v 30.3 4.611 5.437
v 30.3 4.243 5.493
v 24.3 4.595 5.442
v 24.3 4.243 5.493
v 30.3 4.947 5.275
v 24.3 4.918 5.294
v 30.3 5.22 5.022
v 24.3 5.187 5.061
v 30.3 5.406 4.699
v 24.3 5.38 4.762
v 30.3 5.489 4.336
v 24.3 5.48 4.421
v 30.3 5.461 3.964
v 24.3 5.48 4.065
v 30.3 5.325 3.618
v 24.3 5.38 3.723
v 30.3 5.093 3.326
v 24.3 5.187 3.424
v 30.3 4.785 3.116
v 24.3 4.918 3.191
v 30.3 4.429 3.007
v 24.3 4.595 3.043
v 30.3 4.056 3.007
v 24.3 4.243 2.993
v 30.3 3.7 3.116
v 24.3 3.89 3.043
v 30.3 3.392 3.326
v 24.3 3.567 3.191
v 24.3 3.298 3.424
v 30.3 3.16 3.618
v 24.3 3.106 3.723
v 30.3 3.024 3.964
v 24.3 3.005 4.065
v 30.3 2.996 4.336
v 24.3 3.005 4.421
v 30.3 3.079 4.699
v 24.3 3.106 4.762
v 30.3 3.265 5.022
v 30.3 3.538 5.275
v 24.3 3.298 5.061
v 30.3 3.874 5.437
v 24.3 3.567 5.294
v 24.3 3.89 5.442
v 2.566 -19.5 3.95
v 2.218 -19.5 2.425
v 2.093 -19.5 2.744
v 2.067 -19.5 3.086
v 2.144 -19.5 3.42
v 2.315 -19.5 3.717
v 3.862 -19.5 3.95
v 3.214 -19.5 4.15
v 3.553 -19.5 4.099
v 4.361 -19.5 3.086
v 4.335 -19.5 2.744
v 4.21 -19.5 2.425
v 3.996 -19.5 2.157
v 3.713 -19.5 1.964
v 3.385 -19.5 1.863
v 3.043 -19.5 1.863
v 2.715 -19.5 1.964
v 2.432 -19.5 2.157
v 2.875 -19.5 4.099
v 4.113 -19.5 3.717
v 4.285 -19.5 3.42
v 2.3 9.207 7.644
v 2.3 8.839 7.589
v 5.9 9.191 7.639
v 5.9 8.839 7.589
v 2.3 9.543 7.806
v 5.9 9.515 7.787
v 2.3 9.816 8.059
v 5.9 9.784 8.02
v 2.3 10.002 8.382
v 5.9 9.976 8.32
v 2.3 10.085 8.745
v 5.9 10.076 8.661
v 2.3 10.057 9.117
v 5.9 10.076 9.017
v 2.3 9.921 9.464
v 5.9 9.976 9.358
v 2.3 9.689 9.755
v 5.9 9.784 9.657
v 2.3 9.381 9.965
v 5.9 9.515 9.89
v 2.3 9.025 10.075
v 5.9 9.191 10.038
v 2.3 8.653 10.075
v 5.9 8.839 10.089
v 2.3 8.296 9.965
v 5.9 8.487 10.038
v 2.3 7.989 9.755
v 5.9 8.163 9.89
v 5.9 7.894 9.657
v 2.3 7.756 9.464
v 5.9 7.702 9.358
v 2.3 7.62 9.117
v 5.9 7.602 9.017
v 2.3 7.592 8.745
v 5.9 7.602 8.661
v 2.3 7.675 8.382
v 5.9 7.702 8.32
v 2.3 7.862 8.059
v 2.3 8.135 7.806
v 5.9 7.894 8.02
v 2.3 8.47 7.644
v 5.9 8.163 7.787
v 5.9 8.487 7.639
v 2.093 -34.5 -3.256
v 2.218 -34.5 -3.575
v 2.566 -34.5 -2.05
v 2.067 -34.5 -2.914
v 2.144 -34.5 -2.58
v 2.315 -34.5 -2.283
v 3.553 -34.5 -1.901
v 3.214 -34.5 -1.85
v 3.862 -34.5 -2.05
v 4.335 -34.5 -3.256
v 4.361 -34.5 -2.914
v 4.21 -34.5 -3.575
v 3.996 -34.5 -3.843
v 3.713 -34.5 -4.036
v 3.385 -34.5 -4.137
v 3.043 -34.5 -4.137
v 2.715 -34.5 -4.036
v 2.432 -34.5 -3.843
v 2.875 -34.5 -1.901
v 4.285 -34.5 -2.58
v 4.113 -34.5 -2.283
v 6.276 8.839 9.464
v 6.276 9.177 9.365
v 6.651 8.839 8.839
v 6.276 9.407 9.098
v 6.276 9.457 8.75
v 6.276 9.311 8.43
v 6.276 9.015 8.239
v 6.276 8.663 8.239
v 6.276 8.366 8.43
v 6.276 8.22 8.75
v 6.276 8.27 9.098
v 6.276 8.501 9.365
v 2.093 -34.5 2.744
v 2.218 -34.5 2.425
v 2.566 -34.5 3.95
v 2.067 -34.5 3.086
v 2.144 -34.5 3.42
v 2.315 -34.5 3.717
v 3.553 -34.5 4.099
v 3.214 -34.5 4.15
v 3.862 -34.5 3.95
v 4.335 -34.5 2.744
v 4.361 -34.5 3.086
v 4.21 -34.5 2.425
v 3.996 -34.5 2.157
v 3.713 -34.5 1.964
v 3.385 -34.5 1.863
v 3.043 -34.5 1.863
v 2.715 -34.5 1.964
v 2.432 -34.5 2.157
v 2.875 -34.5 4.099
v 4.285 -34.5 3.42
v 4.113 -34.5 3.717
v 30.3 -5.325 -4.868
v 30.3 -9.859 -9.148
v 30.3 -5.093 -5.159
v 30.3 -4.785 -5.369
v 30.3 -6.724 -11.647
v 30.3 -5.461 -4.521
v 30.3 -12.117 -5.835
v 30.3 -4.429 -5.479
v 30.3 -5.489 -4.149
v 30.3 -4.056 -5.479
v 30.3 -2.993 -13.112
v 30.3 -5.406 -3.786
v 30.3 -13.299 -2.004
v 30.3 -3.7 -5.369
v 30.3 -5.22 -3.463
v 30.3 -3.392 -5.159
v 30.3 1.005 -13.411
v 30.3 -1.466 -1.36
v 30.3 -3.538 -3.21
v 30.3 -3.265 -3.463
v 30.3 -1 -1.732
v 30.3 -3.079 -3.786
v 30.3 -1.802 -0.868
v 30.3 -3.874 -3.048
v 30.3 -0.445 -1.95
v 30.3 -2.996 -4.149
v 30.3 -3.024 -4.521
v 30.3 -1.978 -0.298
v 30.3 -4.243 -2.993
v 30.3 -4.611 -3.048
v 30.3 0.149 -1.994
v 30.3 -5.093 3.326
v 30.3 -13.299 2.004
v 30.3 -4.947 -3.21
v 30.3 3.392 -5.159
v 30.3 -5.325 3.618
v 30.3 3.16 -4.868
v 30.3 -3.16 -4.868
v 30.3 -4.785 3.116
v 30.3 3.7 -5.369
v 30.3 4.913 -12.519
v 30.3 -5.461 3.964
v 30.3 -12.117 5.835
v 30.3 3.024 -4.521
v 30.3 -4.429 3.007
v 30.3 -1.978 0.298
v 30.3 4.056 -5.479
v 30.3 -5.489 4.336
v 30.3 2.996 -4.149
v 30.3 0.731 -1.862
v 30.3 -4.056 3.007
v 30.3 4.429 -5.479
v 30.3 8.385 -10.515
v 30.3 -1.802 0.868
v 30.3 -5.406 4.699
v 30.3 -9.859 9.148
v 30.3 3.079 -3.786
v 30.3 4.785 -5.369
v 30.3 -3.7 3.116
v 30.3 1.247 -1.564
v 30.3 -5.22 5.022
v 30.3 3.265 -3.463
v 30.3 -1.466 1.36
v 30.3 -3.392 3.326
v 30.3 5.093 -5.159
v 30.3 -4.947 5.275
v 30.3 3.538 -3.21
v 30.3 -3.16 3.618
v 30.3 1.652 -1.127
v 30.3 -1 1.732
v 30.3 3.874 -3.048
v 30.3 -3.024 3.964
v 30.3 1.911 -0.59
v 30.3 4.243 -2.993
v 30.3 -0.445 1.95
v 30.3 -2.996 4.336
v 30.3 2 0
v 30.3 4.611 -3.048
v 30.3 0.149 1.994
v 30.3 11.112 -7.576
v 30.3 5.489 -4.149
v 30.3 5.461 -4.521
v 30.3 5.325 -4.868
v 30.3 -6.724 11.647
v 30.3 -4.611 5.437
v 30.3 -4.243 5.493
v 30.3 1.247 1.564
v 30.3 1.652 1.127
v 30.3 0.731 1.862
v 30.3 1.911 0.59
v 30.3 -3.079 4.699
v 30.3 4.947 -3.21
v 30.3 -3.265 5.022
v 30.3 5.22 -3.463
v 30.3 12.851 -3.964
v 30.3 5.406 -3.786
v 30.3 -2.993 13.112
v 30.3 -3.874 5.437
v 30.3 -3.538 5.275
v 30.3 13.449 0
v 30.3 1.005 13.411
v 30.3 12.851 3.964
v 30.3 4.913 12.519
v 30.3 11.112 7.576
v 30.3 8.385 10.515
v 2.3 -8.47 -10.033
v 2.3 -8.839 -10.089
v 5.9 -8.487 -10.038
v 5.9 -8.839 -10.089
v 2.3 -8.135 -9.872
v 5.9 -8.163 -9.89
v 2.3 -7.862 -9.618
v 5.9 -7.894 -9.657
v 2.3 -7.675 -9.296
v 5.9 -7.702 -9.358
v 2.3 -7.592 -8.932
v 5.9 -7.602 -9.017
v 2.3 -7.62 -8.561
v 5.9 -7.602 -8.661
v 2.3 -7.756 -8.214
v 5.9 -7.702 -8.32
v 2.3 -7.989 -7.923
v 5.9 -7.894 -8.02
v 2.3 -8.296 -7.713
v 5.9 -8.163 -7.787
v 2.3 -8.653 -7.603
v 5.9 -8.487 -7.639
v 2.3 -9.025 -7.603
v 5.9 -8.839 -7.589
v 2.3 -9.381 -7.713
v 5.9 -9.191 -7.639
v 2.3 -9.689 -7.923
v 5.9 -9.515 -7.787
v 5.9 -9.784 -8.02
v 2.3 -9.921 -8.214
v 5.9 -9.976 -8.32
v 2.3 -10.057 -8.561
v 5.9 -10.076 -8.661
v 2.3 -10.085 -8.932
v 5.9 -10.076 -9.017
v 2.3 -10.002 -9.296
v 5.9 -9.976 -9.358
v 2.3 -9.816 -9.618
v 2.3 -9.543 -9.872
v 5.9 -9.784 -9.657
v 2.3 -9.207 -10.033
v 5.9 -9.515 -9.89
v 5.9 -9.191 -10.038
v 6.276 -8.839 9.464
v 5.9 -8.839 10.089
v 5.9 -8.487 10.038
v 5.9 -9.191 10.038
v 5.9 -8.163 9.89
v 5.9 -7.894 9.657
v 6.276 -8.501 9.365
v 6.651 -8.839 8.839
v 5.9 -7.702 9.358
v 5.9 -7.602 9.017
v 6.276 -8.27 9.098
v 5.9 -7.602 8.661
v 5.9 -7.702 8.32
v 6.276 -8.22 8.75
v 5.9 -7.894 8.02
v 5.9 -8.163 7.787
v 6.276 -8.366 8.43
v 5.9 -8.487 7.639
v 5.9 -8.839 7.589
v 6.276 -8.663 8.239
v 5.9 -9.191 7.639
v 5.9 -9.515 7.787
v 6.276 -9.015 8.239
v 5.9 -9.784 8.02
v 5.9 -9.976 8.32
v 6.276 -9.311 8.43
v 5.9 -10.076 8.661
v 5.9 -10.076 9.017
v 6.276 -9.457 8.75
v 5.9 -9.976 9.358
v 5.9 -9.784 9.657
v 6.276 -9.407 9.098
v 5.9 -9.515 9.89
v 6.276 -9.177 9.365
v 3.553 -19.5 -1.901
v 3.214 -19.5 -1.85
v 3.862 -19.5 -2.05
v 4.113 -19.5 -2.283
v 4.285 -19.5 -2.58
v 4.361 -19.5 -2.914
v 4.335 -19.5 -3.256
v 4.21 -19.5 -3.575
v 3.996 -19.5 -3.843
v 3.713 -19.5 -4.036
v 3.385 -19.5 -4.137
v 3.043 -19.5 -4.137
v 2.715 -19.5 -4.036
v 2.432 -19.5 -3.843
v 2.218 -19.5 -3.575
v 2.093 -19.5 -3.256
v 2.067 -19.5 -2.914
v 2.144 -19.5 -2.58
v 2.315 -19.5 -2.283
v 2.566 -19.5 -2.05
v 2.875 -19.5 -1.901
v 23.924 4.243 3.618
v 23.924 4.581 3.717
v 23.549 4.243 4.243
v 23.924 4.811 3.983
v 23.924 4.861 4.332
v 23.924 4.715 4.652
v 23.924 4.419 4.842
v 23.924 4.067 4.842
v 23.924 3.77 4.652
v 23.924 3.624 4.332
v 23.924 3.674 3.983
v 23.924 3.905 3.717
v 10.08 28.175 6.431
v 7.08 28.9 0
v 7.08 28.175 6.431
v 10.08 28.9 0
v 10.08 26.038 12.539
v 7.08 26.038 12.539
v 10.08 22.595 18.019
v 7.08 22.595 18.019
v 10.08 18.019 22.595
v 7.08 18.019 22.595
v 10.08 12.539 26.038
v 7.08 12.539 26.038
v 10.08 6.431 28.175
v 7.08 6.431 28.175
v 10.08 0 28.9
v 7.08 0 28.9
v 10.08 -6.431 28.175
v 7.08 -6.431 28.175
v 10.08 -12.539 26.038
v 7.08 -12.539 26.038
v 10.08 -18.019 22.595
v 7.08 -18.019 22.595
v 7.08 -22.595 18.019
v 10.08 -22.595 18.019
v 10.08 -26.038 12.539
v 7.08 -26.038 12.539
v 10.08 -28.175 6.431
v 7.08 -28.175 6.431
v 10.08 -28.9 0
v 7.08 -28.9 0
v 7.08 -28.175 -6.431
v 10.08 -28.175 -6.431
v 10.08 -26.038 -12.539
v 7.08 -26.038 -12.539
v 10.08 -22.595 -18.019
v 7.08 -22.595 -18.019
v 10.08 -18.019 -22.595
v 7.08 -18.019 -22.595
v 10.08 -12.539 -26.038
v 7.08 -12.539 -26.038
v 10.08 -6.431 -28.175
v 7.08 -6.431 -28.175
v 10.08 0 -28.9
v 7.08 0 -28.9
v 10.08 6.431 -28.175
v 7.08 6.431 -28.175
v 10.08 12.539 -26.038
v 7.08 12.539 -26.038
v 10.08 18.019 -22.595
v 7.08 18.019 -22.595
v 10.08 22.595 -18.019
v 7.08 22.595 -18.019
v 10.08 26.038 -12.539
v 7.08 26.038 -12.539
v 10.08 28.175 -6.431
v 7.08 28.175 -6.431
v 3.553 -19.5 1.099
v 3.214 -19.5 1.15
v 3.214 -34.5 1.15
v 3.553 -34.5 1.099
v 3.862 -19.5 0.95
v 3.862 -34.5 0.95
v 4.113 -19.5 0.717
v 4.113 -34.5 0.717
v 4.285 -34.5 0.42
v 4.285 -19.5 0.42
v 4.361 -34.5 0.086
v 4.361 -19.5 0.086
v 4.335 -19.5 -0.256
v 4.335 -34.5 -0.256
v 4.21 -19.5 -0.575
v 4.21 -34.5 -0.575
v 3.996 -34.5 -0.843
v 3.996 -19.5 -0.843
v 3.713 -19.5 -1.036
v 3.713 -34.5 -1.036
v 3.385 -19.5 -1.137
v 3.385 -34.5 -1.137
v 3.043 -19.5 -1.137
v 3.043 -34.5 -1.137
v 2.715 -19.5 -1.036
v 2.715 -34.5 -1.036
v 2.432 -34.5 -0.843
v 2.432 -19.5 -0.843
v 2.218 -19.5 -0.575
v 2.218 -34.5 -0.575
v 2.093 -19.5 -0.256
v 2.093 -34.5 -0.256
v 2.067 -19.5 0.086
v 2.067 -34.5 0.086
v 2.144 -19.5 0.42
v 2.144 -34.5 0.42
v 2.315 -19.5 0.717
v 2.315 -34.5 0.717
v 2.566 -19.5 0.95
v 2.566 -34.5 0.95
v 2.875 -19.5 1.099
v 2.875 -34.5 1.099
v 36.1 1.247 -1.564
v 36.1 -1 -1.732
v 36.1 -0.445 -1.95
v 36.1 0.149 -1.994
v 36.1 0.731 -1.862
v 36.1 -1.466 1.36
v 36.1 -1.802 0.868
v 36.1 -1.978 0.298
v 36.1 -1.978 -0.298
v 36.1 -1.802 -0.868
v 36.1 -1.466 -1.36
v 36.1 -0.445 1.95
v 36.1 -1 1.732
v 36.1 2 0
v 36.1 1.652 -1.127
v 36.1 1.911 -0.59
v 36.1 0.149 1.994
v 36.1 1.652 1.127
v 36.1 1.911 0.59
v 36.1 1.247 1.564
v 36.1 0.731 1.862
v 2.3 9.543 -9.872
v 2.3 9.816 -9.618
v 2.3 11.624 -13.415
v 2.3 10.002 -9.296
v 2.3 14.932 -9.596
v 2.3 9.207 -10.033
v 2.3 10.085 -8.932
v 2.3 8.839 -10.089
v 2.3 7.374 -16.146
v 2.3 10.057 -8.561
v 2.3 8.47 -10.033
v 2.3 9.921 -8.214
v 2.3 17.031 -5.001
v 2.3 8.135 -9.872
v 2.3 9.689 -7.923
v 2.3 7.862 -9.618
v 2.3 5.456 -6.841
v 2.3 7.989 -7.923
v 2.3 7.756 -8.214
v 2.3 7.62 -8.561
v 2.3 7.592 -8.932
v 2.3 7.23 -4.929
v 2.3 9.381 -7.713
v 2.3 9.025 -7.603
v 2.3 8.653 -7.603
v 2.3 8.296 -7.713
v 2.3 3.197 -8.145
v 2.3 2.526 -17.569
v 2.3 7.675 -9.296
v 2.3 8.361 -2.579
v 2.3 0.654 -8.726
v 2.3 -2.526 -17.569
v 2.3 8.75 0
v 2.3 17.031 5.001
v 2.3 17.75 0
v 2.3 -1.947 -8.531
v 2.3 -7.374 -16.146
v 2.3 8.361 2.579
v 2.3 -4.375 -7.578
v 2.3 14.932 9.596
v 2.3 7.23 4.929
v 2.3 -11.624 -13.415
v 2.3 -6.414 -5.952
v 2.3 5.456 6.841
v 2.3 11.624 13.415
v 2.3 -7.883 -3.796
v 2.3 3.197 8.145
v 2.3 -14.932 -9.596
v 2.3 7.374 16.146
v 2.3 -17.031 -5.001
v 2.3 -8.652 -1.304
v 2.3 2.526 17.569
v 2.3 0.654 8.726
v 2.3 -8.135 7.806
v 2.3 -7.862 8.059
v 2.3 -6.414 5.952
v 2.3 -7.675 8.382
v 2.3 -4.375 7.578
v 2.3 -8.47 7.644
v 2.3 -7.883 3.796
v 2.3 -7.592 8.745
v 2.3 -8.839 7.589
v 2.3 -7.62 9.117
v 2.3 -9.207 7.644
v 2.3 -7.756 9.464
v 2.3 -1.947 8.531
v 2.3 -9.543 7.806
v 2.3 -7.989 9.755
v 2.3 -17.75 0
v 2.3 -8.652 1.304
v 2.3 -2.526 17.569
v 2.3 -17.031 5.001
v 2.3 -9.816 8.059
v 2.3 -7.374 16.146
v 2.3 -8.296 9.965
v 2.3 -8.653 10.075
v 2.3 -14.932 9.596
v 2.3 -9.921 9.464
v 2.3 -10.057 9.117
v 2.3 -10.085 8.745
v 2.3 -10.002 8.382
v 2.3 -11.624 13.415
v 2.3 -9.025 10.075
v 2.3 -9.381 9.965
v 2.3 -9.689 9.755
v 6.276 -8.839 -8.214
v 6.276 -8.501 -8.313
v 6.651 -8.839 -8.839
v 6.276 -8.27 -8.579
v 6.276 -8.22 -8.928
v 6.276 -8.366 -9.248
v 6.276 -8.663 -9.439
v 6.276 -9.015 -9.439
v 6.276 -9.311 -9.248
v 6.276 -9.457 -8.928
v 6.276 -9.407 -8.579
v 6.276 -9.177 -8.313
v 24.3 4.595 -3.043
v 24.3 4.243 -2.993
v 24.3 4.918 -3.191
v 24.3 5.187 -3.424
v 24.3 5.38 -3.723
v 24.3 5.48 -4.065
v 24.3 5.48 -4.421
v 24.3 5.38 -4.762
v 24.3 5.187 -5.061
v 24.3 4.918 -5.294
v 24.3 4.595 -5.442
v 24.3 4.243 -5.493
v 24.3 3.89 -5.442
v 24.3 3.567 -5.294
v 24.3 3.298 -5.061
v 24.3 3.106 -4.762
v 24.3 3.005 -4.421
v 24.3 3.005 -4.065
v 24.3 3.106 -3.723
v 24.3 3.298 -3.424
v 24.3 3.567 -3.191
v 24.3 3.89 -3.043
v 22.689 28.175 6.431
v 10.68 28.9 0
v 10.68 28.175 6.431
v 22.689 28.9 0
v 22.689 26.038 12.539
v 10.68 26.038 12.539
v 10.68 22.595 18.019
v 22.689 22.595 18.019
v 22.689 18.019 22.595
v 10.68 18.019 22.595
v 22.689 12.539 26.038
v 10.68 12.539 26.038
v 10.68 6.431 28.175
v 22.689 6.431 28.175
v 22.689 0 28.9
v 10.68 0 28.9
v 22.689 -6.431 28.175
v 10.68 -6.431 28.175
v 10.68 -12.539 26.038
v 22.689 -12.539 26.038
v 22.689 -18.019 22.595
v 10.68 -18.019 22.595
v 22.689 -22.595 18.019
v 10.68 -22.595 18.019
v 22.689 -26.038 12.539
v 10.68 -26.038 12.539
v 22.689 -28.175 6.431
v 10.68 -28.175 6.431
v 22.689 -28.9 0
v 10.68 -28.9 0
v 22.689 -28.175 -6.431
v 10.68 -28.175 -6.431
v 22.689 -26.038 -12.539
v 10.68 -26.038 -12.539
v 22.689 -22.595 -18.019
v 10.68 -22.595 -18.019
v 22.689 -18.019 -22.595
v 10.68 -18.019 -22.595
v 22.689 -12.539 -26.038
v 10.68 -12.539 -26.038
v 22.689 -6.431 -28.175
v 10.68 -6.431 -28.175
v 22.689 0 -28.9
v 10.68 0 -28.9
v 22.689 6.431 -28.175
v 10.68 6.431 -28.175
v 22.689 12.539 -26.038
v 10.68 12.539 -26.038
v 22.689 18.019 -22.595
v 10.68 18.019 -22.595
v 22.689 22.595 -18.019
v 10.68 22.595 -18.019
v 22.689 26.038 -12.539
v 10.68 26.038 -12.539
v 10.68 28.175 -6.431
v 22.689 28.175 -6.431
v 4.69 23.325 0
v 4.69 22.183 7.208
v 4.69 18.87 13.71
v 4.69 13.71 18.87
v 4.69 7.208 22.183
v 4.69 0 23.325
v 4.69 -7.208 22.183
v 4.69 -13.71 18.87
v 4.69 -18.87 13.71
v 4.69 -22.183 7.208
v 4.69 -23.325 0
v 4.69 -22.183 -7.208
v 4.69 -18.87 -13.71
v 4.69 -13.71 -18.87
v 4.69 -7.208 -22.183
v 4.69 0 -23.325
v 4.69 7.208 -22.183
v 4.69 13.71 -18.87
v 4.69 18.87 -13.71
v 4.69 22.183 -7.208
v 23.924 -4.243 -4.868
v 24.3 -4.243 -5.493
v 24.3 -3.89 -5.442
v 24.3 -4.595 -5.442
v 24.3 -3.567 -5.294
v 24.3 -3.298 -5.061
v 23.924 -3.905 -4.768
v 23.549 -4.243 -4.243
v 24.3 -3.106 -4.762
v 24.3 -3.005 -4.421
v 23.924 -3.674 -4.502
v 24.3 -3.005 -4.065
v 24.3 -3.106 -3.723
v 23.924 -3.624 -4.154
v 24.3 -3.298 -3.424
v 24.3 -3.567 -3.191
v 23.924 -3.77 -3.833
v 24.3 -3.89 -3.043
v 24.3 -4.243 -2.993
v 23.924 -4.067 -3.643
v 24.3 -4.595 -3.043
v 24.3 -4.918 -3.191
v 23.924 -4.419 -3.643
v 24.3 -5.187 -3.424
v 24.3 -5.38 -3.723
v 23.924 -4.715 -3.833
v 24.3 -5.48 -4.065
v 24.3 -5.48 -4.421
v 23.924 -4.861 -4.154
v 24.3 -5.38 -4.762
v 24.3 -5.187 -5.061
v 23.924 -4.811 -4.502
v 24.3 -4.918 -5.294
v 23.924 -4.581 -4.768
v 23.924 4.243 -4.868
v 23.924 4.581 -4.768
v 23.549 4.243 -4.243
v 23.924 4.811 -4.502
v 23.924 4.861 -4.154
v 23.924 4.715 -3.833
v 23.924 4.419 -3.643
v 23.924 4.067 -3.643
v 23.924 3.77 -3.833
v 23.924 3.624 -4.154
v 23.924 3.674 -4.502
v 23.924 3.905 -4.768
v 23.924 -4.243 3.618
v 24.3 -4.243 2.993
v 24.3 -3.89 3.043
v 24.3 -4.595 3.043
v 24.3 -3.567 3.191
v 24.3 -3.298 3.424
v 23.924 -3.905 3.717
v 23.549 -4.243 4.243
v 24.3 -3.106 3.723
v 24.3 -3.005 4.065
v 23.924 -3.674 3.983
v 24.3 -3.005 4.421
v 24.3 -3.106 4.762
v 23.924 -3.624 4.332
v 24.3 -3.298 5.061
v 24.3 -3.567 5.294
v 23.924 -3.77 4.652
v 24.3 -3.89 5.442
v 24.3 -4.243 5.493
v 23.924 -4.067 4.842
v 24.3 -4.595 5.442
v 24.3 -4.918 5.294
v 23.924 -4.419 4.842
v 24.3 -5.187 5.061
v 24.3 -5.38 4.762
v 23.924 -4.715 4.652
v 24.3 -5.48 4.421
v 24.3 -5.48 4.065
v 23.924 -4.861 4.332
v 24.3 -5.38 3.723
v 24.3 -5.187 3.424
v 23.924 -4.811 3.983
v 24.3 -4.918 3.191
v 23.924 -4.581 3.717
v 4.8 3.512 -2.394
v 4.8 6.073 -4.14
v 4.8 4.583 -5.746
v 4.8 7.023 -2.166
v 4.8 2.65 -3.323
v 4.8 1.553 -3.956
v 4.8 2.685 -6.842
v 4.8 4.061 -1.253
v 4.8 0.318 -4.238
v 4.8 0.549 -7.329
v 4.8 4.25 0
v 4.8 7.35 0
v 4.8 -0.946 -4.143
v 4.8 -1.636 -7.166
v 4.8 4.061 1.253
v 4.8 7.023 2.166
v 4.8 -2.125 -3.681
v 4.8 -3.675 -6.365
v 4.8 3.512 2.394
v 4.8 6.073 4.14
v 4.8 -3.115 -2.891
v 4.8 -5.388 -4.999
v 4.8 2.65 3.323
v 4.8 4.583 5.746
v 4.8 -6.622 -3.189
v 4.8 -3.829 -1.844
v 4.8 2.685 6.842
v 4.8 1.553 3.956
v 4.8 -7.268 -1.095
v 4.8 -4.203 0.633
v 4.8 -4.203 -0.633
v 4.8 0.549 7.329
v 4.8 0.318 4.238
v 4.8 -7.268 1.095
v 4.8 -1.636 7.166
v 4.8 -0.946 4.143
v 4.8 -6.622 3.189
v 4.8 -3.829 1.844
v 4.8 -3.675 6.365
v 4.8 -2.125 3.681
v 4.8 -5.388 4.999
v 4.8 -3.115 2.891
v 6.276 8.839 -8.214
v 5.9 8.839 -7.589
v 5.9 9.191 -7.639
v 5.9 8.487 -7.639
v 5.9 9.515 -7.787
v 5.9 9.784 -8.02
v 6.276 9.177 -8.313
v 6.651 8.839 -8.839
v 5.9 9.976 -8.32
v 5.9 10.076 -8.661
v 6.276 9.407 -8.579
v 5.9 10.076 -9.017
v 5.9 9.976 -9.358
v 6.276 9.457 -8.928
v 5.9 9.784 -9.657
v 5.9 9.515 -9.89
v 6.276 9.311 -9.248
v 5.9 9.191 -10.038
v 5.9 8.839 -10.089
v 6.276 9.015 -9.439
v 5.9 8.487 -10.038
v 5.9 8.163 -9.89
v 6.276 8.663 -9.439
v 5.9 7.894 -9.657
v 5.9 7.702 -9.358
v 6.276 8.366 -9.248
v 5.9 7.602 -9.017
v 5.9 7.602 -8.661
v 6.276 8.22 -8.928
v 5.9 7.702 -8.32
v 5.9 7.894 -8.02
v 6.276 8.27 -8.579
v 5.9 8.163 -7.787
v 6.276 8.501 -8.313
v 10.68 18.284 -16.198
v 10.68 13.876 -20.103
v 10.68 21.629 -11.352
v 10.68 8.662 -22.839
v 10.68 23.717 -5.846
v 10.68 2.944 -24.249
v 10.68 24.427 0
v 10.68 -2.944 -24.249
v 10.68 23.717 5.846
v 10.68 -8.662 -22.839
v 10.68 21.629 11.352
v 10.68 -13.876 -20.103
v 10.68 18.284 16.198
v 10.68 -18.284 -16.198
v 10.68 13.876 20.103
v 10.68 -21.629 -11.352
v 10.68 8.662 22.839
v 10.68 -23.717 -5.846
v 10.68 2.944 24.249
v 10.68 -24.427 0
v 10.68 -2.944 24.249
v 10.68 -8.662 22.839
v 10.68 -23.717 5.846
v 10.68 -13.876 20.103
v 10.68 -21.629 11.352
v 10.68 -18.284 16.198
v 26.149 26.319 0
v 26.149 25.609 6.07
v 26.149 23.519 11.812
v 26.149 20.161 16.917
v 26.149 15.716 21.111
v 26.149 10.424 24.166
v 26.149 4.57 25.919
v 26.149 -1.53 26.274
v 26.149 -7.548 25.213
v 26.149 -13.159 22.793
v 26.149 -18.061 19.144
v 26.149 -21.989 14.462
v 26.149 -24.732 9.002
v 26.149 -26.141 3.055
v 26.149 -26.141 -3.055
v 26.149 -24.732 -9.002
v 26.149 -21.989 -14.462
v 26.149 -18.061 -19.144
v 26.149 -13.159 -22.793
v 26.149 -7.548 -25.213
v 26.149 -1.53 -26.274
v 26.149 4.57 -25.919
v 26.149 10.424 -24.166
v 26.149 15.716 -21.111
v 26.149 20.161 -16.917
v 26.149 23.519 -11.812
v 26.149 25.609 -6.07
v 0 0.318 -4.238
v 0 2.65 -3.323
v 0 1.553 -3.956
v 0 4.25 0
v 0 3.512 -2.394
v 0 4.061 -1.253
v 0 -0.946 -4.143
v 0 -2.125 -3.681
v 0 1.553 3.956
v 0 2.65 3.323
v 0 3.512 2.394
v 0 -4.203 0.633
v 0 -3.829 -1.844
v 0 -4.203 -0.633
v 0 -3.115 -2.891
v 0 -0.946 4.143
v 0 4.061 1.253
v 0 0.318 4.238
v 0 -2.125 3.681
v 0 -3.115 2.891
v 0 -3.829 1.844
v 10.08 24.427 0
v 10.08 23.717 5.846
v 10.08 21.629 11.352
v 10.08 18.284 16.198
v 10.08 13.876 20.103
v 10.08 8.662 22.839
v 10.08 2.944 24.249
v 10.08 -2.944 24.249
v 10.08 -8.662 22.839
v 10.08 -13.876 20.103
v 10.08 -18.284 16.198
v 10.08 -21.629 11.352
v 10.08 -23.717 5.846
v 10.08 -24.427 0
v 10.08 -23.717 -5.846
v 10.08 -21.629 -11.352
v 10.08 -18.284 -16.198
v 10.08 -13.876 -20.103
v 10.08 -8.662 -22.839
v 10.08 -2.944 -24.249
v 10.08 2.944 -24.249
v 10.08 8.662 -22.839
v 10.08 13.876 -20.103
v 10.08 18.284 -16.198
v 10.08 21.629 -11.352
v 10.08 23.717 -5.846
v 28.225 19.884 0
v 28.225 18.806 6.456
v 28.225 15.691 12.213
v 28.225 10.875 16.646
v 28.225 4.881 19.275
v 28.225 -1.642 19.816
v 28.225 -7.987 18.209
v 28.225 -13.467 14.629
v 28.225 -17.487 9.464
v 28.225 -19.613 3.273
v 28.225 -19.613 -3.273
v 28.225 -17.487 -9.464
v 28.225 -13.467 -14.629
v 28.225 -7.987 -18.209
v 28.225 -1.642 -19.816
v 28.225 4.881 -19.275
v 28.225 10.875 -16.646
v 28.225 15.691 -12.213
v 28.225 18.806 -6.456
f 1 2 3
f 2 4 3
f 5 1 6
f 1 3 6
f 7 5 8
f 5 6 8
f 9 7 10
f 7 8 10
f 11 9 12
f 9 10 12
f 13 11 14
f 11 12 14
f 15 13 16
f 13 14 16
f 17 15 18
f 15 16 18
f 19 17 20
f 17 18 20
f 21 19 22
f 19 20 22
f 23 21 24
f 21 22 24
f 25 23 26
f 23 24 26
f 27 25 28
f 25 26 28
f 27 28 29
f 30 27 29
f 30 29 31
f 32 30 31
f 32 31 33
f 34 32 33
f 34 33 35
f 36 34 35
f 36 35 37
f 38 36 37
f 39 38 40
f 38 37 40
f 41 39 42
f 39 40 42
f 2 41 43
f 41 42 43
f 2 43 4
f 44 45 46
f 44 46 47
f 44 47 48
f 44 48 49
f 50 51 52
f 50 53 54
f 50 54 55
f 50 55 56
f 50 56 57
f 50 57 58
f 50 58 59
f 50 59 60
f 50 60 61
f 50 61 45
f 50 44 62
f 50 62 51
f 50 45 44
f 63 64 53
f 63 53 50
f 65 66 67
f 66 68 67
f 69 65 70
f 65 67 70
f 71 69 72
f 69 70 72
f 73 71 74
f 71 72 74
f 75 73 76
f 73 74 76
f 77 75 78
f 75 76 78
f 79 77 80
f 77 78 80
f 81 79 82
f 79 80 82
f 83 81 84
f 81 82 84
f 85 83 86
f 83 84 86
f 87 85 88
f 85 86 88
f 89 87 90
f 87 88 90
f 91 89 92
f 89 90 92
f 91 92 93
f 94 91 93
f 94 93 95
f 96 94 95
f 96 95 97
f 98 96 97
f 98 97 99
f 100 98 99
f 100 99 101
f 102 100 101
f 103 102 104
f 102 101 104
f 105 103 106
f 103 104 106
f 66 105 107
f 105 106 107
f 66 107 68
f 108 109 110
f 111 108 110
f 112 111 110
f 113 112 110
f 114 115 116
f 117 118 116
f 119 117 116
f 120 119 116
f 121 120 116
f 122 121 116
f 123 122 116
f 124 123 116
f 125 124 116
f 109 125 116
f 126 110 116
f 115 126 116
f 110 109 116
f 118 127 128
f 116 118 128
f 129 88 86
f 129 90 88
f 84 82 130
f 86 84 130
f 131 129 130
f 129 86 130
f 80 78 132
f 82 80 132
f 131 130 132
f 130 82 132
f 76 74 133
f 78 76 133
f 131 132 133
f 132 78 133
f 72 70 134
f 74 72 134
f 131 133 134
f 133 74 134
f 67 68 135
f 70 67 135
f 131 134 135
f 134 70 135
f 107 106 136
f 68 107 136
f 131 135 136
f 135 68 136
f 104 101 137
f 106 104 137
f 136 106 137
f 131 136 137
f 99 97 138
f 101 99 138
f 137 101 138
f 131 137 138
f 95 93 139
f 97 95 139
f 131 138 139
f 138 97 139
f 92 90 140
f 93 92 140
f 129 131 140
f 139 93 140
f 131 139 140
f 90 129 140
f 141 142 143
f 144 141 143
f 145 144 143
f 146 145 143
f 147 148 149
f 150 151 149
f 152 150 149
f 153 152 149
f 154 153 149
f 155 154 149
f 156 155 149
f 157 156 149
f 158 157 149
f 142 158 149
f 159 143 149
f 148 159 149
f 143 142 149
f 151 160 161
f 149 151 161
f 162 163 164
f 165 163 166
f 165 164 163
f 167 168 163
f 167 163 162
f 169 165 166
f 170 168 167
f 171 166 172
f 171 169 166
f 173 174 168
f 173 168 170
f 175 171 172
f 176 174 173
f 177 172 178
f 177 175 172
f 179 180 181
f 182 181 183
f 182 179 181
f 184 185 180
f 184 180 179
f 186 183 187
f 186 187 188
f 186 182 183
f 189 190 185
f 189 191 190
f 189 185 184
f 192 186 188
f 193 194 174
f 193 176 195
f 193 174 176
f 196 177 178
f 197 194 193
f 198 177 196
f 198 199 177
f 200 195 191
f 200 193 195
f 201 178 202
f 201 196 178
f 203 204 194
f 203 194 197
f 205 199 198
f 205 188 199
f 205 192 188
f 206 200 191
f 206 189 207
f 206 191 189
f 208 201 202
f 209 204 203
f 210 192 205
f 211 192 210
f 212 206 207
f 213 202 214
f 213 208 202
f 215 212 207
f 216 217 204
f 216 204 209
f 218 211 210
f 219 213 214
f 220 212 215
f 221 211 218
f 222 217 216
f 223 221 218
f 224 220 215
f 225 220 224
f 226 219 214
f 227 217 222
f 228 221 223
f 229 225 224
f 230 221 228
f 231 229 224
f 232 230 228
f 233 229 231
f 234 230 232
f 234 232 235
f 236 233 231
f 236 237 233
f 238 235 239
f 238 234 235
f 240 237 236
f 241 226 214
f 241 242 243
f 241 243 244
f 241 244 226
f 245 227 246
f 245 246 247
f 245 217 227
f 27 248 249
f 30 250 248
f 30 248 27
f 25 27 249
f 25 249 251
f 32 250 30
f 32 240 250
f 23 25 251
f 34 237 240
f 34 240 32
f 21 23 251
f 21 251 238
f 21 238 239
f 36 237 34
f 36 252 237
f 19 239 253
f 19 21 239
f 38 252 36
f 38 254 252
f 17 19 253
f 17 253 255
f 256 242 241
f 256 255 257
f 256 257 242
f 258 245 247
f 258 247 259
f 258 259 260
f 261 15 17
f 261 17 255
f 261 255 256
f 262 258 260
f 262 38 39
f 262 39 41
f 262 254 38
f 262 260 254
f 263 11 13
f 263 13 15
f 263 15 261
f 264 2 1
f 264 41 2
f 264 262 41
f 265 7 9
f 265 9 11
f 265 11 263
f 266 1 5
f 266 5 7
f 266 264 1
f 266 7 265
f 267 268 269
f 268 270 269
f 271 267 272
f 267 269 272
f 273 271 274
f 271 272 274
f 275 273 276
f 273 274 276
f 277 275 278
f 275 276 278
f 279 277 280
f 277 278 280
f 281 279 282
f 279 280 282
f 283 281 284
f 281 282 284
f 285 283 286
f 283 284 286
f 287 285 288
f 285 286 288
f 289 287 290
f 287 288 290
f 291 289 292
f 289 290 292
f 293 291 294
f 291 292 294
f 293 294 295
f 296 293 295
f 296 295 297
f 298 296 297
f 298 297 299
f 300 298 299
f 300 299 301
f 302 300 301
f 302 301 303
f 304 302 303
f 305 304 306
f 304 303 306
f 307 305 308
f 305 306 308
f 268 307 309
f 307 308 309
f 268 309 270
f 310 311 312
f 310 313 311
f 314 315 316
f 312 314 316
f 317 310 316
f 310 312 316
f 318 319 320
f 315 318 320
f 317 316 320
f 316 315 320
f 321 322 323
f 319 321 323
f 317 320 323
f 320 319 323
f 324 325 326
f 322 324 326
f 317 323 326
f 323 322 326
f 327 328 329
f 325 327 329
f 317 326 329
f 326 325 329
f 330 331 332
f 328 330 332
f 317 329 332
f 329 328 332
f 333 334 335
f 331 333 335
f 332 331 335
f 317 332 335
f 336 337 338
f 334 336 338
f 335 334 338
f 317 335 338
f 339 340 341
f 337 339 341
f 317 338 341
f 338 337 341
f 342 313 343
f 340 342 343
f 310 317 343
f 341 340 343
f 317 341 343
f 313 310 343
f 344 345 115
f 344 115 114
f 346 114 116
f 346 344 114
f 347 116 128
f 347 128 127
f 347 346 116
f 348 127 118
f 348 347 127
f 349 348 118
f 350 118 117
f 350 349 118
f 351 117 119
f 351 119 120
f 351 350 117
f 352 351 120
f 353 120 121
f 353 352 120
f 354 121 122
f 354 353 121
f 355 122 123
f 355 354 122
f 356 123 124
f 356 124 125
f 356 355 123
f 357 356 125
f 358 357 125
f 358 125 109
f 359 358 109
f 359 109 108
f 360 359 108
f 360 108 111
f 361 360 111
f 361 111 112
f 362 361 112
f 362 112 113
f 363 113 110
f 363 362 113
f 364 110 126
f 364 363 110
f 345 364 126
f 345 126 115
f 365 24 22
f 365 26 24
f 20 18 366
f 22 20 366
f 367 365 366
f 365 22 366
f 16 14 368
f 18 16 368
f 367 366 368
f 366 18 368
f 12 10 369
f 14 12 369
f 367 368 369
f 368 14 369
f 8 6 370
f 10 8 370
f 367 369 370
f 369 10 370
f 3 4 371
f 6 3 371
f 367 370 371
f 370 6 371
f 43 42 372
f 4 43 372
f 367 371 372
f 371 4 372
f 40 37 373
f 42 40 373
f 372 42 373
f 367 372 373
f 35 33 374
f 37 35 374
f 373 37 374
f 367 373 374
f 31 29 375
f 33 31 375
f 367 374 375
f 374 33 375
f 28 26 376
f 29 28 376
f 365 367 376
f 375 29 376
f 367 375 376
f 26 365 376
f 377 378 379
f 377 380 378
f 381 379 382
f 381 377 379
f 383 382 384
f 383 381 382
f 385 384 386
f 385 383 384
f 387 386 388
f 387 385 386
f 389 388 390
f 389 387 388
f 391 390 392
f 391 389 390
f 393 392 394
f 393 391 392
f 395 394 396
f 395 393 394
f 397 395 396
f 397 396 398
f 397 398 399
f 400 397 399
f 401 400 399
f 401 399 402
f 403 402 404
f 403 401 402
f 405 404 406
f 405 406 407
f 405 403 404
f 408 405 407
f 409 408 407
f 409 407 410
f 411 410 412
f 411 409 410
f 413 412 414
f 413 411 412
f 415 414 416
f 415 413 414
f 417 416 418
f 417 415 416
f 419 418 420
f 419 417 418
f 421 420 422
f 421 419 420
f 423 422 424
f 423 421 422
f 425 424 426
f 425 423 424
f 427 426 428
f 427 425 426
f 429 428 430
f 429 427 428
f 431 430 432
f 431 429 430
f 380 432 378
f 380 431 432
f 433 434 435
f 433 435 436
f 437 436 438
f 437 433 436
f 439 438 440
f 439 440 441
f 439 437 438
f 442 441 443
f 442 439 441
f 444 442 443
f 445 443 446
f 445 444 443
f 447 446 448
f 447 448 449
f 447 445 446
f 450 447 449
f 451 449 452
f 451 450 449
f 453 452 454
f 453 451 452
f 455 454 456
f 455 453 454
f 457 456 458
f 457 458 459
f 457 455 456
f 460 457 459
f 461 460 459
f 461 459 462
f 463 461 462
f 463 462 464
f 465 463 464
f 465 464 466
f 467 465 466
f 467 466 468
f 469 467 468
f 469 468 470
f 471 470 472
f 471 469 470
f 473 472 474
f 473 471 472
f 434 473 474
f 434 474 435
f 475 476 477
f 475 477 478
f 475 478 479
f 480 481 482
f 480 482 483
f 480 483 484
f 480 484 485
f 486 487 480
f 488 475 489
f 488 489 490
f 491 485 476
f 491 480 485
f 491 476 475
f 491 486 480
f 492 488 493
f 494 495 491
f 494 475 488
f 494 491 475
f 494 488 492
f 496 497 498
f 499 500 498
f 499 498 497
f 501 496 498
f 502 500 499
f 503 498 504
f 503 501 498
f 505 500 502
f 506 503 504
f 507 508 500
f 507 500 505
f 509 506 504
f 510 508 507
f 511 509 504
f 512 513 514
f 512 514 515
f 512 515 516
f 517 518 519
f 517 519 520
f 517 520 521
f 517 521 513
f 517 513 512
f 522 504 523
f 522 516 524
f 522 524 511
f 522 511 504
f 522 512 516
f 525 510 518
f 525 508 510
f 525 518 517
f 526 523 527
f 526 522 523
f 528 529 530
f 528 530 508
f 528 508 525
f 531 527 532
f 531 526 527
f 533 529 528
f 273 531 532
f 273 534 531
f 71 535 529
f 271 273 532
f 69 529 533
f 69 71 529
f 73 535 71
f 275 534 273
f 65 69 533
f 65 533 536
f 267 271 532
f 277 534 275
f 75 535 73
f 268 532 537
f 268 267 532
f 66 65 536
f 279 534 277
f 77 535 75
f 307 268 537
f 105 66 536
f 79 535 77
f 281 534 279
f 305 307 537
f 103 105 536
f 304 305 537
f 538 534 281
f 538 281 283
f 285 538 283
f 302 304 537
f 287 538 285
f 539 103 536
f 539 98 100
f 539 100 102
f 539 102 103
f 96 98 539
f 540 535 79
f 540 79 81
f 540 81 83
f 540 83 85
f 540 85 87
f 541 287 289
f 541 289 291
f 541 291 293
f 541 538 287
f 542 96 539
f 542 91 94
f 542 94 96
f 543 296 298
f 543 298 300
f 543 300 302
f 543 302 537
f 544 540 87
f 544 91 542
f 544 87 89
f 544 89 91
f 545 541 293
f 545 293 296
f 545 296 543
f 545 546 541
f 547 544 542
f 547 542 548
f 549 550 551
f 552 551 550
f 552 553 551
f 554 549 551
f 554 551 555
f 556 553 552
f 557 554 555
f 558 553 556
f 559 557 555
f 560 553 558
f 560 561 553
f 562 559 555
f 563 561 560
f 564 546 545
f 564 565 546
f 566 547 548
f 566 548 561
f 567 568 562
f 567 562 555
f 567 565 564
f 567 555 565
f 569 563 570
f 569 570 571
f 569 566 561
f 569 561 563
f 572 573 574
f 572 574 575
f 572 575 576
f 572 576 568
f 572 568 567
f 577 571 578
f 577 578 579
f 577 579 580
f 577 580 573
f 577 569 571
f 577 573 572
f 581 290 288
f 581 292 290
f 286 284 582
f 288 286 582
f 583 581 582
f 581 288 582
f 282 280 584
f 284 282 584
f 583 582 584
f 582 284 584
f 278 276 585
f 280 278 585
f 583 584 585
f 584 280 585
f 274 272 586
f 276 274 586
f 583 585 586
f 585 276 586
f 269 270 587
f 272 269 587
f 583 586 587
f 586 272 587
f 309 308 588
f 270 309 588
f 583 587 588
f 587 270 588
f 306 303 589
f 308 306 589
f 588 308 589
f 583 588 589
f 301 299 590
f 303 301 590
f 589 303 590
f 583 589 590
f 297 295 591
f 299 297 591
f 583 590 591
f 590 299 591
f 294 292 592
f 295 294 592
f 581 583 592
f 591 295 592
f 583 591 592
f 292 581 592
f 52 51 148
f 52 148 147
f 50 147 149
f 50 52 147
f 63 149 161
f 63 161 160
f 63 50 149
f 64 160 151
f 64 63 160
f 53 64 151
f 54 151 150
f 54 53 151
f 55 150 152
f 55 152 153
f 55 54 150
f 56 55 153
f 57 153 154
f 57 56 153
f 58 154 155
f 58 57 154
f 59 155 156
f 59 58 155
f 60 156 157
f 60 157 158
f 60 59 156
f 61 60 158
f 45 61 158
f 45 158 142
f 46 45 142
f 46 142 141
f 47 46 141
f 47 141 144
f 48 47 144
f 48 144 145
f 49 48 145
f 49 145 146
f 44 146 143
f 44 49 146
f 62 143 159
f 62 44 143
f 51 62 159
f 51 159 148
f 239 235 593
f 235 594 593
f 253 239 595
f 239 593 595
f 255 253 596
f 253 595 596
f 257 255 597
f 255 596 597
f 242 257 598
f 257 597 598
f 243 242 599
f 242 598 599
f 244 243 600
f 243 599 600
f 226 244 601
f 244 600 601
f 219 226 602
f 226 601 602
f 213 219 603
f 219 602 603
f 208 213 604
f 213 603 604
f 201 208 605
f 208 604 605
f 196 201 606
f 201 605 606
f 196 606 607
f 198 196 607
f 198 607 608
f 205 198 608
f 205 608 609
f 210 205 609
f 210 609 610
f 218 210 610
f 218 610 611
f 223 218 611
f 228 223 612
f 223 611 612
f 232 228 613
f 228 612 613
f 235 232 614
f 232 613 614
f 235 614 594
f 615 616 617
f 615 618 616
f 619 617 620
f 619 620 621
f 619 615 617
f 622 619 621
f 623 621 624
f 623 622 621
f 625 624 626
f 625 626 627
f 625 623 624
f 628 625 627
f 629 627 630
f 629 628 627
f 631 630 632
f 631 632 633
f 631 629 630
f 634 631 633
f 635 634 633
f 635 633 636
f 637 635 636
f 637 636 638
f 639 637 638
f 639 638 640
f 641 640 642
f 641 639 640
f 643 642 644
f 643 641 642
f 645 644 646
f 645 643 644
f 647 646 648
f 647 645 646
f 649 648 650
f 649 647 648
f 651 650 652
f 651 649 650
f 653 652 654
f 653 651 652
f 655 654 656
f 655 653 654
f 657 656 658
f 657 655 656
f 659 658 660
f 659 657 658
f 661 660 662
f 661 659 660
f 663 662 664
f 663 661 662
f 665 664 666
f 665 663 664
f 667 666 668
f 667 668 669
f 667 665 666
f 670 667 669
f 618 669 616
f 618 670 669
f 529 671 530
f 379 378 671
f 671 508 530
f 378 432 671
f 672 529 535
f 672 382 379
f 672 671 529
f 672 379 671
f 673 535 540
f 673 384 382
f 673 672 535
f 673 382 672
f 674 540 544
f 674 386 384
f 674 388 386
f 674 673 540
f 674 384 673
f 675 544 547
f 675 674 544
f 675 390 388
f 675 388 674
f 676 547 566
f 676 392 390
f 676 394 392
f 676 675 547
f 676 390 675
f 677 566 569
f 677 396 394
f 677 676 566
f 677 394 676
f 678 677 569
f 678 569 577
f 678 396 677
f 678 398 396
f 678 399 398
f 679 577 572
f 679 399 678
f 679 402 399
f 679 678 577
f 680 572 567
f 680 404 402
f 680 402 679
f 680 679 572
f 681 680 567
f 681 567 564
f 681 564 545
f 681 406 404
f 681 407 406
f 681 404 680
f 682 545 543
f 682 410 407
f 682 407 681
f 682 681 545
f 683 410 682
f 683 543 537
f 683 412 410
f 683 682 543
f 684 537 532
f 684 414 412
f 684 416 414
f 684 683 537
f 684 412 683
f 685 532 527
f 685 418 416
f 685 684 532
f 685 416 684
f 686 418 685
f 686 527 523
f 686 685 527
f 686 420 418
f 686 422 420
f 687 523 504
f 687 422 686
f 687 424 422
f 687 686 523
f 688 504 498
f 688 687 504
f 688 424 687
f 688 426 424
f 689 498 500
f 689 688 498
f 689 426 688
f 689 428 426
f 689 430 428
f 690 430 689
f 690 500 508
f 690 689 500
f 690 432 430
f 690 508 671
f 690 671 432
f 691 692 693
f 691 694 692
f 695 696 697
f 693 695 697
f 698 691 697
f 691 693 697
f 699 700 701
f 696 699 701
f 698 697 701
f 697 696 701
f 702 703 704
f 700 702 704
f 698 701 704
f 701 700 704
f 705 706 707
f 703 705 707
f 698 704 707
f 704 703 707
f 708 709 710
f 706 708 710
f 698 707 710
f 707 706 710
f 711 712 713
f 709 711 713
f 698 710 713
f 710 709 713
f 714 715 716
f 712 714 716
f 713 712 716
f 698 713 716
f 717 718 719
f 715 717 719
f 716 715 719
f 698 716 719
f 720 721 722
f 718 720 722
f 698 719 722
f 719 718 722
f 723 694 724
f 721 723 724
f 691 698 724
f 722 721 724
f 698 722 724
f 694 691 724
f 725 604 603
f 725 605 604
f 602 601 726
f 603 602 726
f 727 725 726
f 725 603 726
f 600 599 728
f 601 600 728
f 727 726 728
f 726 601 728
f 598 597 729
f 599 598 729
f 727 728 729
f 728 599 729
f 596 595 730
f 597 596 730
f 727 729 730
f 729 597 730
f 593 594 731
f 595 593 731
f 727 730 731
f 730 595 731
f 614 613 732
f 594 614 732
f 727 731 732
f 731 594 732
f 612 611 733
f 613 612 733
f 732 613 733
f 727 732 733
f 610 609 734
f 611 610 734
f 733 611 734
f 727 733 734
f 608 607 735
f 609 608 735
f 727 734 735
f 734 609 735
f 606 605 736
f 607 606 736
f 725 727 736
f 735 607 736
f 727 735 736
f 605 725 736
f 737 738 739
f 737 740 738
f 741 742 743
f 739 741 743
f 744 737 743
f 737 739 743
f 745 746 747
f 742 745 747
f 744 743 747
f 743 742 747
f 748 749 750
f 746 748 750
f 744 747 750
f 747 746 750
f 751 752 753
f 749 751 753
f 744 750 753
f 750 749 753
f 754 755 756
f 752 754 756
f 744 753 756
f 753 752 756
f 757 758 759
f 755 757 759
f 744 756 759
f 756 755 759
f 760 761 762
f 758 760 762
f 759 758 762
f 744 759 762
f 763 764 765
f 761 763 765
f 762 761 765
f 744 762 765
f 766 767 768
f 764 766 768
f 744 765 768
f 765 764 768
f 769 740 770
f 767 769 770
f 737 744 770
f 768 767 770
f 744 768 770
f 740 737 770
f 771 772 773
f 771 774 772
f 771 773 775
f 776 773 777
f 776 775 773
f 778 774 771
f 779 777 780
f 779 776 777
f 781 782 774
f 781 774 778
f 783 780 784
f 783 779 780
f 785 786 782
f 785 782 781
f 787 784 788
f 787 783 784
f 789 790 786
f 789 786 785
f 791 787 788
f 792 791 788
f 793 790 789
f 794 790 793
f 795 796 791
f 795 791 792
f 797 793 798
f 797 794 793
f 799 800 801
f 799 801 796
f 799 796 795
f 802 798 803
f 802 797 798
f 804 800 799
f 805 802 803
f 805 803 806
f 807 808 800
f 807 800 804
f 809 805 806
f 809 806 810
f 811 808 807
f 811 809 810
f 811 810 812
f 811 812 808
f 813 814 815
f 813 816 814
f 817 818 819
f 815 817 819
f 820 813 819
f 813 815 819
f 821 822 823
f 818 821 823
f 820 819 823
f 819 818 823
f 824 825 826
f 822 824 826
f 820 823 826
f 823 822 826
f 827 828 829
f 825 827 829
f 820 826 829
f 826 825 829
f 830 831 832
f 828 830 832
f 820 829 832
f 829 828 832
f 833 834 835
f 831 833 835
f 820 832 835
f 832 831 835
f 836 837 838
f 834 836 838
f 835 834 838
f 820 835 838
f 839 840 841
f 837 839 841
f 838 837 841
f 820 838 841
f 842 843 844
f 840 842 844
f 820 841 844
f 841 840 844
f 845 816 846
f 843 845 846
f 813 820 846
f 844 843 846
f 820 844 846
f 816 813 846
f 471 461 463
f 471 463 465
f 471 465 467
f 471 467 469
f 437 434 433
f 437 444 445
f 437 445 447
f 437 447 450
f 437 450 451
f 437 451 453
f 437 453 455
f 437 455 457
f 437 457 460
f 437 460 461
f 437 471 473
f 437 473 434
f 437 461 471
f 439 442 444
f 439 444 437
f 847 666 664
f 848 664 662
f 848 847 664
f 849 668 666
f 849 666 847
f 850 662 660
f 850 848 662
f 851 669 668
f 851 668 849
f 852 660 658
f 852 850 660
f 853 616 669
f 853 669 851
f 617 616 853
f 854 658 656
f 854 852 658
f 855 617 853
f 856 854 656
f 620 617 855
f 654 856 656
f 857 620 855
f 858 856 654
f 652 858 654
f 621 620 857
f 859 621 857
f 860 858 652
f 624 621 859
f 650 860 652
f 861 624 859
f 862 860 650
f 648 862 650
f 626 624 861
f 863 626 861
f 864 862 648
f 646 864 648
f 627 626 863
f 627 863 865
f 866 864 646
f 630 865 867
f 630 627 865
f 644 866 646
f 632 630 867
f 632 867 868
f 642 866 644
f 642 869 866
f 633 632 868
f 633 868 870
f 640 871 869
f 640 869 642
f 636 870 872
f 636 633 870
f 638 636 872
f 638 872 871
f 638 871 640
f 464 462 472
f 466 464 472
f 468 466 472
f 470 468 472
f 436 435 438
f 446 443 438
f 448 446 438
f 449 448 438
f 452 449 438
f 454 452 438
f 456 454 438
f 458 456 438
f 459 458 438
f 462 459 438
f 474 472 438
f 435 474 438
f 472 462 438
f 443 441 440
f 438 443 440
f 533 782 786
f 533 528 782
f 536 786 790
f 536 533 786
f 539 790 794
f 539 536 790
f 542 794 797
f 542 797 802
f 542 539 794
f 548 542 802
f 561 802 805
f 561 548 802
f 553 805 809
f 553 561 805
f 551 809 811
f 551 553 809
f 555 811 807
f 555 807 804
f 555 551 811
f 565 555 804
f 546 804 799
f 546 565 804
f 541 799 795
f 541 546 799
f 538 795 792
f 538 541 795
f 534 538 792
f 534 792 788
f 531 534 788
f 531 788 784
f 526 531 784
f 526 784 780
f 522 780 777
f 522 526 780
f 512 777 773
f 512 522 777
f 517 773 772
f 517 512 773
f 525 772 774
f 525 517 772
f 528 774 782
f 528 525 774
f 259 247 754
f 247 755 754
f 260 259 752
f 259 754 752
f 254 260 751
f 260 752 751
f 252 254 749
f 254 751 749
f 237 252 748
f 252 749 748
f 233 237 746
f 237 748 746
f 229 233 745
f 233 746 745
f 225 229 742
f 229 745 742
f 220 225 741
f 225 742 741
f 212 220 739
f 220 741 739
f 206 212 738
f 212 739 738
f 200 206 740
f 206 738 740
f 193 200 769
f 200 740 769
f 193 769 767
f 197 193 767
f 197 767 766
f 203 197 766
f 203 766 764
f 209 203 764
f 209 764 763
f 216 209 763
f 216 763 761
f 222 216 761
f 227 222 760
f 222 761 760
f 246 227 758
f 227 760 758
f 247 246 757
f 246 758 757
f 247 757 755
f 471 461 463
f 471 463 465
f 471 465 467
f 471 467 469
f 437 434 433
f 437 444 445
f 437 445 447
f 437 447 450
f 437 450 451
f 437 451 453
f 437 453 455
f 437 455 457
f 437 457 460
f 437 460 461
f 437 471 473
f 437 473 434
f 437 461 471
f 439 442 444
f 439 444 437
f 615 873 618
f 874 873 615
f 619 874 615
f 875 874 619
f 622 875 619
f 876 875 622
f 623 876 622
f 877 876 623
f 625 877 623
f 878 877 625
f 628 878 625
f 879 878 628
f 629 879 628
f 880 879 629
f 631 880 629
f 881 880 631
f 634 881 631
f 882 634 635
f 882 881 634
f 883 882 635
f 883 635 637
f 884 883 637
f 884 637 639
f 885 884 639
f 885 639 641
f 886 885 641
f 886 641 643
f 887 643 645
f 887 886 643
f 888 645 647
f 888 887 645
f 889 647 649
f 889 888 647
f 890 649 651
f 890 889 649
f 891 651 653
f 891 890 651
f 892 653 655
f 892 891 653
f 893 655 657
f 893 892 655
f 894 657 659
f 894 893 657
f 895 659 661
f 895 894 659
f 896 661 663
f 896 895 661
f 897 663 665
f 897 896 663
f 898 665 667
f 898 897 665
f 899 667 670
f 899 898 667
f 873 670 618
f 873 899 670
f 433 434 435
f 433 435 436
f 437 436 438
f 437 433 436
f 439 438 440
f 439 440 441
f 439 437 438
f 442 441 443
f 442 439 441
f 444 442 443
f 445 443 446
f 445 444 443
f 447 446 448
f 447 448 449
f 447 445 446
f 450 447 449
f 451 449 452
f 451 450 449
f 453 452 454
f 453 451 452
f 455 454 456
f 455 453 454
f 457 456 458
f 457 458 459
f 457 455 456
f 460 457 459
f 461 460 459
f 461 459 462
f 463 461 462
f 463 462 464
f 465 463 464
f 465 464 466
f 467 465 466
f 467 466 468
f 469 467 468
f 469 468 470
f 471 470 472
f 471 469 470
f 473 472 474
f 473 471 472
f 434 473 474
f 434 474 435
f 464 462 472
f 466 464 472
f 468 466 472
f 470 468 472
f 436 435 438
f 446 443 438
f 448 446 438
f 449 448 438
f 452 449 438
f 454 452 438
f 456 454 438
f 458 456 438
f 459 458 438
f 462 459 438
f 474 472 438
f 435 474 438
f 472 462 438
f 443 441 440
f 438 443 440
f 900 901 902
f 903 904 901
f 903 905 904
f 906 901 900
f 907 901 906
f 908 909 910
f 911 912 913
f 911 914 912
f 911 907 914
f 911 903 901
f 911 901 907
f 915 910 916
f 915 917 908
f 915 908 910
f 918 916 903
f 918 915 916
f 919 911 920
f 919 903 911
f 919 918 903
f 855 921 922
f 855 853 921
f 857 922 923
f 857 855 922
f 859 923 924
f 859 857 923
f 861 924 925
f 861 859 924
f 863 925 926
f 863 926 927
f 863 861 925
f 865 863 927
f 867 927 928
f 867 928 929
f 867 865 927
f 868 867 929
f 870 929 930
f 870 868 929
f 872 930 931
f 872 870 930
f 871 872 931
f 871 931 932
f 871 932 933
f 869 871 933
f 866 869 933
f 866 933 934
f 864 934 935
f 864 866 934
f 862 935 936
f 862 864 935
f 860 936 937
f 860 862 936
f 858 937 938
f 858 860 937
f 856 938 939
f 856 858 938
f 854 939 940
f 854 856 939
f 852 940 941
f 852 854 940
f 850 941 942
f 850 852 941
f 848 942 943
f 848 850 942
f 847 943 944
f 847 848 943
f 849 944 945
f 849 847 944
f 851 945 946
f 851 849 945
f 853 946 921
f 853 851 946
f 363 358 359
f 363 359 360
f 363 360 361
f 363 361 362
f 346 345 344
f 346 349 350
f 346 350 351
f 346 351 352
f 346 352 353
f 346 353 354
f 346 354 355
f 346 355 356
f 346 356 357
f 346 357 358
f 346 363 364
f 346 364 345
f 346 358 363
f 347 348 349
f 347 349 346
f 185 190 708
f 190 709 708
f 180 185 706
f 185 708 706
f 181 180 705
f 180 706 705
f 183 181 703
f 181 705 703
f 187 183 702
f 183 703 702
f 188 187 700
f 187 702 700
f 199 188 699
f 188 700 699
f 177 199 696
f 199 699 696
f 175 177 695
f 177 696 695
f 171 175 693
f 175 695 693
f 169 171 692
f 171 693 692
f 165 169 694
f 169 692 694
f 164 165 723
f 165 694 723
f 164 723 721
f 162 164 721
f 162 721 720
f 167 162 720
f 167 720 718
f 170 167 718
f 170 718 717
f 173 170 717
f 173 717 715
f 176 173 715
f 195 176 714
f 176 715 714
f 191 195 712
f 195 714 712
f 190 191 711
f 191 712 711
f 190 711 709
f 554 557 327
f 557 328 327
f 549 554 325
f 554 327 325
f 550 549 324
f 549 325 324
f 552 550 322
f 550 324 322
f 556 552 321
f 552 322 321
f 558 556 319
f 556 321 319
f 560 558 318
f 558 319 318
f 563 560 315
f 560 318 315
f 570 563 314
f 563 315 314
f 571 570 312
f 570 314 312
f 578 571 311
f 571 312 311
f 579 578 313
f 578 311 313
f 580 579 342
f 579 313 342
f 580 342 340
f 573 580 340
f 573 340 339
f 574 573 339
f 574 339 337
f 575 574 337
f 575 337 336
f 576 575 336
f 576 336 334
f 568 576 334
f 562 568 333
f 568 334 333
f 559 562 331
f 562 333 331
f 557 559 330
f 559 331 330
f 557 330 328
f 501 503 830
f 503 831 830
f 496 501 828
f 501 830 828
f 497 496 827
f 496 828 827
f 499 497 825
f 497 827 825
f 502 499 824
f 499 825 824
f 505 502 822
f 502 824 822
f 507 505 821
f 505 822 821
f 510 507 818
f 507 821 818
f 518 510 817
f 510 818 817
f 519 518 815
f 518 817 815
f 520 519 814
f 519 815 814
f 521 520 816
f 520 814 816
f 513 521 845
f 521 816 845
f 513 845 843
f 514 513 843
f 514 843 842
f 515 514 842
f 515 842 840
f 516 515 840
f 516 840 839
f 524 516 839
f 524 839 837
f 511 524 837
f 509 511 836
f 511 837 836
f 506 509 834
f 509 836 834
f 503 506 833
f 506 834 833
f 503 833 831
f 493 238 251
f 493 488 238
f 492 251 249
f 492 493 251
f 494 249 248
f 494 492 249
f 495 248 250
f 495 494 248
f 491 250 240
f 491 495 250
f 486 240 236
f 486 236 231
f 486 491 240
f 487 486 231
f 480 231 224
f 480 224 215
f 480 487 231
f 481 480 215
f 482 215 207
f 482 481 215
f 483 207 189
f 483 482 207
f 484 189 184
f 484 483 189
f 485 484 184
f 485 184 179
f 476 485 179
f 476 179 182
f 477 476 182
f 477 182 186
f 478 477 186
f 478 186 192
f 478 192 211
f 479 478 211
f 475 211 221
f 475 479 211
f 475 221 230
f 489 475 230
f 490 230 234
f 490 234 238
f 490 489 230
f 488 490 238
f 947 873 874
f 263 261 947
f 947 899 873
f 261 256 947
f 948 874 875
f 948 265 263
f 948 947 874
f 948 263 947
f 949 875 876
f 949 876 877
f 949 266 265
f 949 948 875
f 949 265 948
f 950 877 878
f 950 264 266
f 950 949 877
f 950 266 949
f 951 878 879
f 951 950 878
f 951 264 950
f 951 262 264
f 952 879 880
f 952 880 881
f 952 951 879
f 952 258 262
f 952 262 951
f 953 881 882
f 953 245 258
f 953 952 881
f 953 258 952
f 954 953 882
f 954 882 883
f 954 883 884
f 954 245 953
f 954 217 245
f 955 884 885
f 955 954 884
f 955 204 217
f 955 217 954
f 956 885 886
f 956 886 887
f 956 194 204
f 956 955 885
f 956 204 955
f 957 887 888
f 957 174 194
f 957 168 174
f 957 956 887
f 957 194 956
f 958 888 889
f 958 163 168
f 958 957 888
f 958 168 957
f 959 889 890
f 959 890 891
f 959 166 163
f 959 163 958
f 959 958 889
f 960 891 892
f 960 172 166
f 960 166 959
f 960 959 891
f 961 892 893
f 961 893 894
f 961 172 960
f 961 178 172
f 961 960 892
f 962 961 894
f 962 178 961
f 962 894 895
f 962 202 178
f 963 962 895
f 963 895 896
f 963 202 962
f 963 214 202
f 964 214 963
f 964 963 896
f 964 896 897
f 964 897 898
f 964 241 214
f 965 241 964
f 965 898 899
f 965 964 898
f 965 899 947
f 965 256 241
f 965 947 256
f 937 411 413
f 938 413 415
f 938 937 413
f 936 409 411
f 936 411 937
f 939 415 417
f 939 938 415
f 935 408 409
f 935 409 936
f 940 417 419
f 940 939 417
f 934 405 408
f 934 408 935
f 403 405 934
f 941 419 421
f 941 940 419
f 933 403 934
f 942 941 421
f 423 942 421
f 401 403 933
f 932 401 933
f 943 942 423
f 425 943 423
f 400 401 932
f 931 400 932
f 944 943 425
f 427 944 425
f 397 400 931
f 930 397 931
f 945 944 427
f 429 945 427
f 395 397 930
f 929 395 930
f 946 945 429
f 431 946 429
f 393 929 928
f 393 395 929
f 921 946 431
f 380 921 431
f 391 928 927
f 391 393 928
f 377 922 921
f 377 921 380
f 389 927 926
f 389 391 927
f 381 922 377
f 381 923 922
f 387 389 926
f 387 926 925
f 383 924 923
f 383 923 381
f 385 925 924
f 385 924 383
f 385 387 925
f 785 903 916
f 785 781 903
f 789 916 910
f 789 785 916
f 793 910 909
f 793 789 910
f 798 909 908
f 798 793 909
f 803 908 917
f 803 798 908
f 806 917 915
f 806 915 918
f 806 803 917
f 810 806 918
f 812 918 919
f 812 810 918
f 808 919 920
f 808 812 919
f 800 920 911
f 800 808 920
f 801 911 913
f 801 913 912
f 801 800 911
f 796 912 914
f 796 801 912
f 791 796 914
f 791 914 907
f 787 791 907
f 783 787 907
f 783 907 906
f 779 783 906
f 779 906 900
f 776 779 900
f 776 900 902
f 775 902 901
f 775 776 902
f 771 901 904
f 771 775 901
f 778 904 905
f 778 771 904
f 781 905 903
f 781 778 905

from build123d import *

# Parameters (mm, degrees)
TROU_POUR_TARAUDAGE_POUR_TROU_TARAUD_M3_D     = 2.5
TROU_POUR_TARAUDAGE_POUR_TROU_TARAUD_M3_DEPTH = 3.6
TROU_POUR_TARAUDAGE_POUR_TROU_TARAUD_M3_TIP   = 0.751075774
TROU_POUR_TARAUDAGE_POUR_TROU_TARAUD_2_D      = 2.5
TROU_POUR_TARAUDAGE_POUR_TROU_TARAUD_2_DEPTH  = 6
TROU_POUR_TARAUDAGE_POUR_TROU_TARAUD_2_TIP    = 0.751075774
BOSS_EXTRU_1_START                            = -19.5
ESQUISSE6_R                                   = 1.15
BOSS_EXTRU_1_DEPTH                            = 15
R_P_TITION_LIN_AIRE1_COUNT                    = 2
R_P_TITION_LIN_AIRE1_PITCH                    = 3
R_P_TITION_LIN_AIRE1_COUNT_DIR2               = 2
R_P_TITION_LIN_AIRE1_PITCH_DIR2               = 3


# Read off the part's stored shape, not the designer's step: Révolution1
with BuildPart() as part:
    # Révolution1 outline → Révolution1 (revolve)
    with BuildSketch(Plane.YX):
        Polygon((0, 36.1), (0, 0), (4.25, 0), (4.25, 4.8), (7.35, 4.8), (8.75, 2.3), (17.75, 2.3), (28.9, 7.079588628), (28.9, 10.079588628), (24.426597876, 10.079588628), (24.426597876, 10.679588628), (28.9, 10.679588628), (28.9, 22.688797149), (26.318773317, 26.149098698), (13.448864835, 30.3), (2, 30.3), (2, 36.1), align=None)
    revolve(axis=Axis((0, 0, 0), (1, 0, 0)))

    # Trou pour taraudage pour trou taraud_ M3
    with Locations(Plane.ZY.offset(-2.3)):
        with Locations((-8.838834765, 8.838834765), (8.838834765, -8.838834765), (-8.838834765, -8.838834765), (8.838834765, 8.838834765)):
            Hole(TROU_POUR_TARAUDAGE_POUR_TROU_TARAUD_M3_D / 2, depth=TROU_POUR_TARAUDAGE_POUR_TROU_TARAUD_M3_DEPTH)
            with Locations((0, 0, -(TROU_POUR_TARAUDAGE_POUR_TROU_TARAUD_M3_DEPTH + TROU_POUR_TARAUDAGE_POUR_TROU_TARAUD_M3_TIP / 2))):  # 118° drill point
                Cone(0, TROU_POUR_TARAUDAGE_POUR_TROU_TARAUD_M3_D / 2, TROU_POUR_TARAUDAGE_POUR_TROU_TARAUD_M3_TIP, mode=Mode.SUBTRACT)

    # Trou pour taraudage pour trou taraud 2
    with Locations(Plane(origin=(30.3, 0, 0), x_dir=(0, 0, -1), z_dir=(1, 0, 0))):
        with Locations((-4.242640687, 4.242640687), (4.242640687, -4.242640687), (-4.242640687, -4.242640687), (4.242640687, 4.242640687)):
            Hole(TROU_POUR_TARAUDAGE_POUR_TROU_TARAUD_2_D / 2, depth=TROU_POUR_TARAUDAGE_POUR_TROU_TARAUD_2_DEPTH)
            with Locations((0, 0, -(TROU_POUR_TARAUDAGE_POUR_TROU_TARAUD_2_DEPTH + TROU_POUR_TARAUDAGE_POUR_TROU_TARAUD_2_TIP / 2))):  # 118° drill point
                Cone(0, TROU_POUR_TARAUDAGE_POUR_TROU_TARAUD_2_D / 2, TROU_POUR_TARAUDAGE_POUR_TROU_TARAUD_2_TIP, mode=Mode.SUBTRACT)


with BuildPart() as body_2:
    # Esquisse6 → Boss.-Extru.1 (new body)
    with BuildSketch(Plane(origin=(0, 0, 0), x_dir=(1, 0, 0), z_dir=(0, 1, 0)).offset(BOSS_EXTRU_1_START)):
        with Locations(Location((3.214052754, 0, 0), (0, 0, 270))):
            Circle(ESQUISSE6_R)
    boss_extru_1 = extrude(amount=-BOSS_EXTRU_1_DEPTH)


with BuildPart() as r_p_tition_lin_aire1_1:
    # Répétition linéaire1: Boss.-Extru.1 2 × 2
    with Locations(*[Vector(0, 0, 1) * (i * R_P_TITION_LIN_AIRE1_PITCH) + Vector(0, 0, -1) * (j * R_P_TITION_LIN_AIRE1_PITCH_DIR2) for i in range(R_P_TITION_LIN_AIRE1_COUNT) for j in range(R_P_TITION_LIN_AIRE1_COUNT_DIR2) if (i, j) != (0, 0)]):
        add(boss_extru_1)


solid = Compound([part.part, body_2.part, r_p_tition_lin_aire1_1.part])
